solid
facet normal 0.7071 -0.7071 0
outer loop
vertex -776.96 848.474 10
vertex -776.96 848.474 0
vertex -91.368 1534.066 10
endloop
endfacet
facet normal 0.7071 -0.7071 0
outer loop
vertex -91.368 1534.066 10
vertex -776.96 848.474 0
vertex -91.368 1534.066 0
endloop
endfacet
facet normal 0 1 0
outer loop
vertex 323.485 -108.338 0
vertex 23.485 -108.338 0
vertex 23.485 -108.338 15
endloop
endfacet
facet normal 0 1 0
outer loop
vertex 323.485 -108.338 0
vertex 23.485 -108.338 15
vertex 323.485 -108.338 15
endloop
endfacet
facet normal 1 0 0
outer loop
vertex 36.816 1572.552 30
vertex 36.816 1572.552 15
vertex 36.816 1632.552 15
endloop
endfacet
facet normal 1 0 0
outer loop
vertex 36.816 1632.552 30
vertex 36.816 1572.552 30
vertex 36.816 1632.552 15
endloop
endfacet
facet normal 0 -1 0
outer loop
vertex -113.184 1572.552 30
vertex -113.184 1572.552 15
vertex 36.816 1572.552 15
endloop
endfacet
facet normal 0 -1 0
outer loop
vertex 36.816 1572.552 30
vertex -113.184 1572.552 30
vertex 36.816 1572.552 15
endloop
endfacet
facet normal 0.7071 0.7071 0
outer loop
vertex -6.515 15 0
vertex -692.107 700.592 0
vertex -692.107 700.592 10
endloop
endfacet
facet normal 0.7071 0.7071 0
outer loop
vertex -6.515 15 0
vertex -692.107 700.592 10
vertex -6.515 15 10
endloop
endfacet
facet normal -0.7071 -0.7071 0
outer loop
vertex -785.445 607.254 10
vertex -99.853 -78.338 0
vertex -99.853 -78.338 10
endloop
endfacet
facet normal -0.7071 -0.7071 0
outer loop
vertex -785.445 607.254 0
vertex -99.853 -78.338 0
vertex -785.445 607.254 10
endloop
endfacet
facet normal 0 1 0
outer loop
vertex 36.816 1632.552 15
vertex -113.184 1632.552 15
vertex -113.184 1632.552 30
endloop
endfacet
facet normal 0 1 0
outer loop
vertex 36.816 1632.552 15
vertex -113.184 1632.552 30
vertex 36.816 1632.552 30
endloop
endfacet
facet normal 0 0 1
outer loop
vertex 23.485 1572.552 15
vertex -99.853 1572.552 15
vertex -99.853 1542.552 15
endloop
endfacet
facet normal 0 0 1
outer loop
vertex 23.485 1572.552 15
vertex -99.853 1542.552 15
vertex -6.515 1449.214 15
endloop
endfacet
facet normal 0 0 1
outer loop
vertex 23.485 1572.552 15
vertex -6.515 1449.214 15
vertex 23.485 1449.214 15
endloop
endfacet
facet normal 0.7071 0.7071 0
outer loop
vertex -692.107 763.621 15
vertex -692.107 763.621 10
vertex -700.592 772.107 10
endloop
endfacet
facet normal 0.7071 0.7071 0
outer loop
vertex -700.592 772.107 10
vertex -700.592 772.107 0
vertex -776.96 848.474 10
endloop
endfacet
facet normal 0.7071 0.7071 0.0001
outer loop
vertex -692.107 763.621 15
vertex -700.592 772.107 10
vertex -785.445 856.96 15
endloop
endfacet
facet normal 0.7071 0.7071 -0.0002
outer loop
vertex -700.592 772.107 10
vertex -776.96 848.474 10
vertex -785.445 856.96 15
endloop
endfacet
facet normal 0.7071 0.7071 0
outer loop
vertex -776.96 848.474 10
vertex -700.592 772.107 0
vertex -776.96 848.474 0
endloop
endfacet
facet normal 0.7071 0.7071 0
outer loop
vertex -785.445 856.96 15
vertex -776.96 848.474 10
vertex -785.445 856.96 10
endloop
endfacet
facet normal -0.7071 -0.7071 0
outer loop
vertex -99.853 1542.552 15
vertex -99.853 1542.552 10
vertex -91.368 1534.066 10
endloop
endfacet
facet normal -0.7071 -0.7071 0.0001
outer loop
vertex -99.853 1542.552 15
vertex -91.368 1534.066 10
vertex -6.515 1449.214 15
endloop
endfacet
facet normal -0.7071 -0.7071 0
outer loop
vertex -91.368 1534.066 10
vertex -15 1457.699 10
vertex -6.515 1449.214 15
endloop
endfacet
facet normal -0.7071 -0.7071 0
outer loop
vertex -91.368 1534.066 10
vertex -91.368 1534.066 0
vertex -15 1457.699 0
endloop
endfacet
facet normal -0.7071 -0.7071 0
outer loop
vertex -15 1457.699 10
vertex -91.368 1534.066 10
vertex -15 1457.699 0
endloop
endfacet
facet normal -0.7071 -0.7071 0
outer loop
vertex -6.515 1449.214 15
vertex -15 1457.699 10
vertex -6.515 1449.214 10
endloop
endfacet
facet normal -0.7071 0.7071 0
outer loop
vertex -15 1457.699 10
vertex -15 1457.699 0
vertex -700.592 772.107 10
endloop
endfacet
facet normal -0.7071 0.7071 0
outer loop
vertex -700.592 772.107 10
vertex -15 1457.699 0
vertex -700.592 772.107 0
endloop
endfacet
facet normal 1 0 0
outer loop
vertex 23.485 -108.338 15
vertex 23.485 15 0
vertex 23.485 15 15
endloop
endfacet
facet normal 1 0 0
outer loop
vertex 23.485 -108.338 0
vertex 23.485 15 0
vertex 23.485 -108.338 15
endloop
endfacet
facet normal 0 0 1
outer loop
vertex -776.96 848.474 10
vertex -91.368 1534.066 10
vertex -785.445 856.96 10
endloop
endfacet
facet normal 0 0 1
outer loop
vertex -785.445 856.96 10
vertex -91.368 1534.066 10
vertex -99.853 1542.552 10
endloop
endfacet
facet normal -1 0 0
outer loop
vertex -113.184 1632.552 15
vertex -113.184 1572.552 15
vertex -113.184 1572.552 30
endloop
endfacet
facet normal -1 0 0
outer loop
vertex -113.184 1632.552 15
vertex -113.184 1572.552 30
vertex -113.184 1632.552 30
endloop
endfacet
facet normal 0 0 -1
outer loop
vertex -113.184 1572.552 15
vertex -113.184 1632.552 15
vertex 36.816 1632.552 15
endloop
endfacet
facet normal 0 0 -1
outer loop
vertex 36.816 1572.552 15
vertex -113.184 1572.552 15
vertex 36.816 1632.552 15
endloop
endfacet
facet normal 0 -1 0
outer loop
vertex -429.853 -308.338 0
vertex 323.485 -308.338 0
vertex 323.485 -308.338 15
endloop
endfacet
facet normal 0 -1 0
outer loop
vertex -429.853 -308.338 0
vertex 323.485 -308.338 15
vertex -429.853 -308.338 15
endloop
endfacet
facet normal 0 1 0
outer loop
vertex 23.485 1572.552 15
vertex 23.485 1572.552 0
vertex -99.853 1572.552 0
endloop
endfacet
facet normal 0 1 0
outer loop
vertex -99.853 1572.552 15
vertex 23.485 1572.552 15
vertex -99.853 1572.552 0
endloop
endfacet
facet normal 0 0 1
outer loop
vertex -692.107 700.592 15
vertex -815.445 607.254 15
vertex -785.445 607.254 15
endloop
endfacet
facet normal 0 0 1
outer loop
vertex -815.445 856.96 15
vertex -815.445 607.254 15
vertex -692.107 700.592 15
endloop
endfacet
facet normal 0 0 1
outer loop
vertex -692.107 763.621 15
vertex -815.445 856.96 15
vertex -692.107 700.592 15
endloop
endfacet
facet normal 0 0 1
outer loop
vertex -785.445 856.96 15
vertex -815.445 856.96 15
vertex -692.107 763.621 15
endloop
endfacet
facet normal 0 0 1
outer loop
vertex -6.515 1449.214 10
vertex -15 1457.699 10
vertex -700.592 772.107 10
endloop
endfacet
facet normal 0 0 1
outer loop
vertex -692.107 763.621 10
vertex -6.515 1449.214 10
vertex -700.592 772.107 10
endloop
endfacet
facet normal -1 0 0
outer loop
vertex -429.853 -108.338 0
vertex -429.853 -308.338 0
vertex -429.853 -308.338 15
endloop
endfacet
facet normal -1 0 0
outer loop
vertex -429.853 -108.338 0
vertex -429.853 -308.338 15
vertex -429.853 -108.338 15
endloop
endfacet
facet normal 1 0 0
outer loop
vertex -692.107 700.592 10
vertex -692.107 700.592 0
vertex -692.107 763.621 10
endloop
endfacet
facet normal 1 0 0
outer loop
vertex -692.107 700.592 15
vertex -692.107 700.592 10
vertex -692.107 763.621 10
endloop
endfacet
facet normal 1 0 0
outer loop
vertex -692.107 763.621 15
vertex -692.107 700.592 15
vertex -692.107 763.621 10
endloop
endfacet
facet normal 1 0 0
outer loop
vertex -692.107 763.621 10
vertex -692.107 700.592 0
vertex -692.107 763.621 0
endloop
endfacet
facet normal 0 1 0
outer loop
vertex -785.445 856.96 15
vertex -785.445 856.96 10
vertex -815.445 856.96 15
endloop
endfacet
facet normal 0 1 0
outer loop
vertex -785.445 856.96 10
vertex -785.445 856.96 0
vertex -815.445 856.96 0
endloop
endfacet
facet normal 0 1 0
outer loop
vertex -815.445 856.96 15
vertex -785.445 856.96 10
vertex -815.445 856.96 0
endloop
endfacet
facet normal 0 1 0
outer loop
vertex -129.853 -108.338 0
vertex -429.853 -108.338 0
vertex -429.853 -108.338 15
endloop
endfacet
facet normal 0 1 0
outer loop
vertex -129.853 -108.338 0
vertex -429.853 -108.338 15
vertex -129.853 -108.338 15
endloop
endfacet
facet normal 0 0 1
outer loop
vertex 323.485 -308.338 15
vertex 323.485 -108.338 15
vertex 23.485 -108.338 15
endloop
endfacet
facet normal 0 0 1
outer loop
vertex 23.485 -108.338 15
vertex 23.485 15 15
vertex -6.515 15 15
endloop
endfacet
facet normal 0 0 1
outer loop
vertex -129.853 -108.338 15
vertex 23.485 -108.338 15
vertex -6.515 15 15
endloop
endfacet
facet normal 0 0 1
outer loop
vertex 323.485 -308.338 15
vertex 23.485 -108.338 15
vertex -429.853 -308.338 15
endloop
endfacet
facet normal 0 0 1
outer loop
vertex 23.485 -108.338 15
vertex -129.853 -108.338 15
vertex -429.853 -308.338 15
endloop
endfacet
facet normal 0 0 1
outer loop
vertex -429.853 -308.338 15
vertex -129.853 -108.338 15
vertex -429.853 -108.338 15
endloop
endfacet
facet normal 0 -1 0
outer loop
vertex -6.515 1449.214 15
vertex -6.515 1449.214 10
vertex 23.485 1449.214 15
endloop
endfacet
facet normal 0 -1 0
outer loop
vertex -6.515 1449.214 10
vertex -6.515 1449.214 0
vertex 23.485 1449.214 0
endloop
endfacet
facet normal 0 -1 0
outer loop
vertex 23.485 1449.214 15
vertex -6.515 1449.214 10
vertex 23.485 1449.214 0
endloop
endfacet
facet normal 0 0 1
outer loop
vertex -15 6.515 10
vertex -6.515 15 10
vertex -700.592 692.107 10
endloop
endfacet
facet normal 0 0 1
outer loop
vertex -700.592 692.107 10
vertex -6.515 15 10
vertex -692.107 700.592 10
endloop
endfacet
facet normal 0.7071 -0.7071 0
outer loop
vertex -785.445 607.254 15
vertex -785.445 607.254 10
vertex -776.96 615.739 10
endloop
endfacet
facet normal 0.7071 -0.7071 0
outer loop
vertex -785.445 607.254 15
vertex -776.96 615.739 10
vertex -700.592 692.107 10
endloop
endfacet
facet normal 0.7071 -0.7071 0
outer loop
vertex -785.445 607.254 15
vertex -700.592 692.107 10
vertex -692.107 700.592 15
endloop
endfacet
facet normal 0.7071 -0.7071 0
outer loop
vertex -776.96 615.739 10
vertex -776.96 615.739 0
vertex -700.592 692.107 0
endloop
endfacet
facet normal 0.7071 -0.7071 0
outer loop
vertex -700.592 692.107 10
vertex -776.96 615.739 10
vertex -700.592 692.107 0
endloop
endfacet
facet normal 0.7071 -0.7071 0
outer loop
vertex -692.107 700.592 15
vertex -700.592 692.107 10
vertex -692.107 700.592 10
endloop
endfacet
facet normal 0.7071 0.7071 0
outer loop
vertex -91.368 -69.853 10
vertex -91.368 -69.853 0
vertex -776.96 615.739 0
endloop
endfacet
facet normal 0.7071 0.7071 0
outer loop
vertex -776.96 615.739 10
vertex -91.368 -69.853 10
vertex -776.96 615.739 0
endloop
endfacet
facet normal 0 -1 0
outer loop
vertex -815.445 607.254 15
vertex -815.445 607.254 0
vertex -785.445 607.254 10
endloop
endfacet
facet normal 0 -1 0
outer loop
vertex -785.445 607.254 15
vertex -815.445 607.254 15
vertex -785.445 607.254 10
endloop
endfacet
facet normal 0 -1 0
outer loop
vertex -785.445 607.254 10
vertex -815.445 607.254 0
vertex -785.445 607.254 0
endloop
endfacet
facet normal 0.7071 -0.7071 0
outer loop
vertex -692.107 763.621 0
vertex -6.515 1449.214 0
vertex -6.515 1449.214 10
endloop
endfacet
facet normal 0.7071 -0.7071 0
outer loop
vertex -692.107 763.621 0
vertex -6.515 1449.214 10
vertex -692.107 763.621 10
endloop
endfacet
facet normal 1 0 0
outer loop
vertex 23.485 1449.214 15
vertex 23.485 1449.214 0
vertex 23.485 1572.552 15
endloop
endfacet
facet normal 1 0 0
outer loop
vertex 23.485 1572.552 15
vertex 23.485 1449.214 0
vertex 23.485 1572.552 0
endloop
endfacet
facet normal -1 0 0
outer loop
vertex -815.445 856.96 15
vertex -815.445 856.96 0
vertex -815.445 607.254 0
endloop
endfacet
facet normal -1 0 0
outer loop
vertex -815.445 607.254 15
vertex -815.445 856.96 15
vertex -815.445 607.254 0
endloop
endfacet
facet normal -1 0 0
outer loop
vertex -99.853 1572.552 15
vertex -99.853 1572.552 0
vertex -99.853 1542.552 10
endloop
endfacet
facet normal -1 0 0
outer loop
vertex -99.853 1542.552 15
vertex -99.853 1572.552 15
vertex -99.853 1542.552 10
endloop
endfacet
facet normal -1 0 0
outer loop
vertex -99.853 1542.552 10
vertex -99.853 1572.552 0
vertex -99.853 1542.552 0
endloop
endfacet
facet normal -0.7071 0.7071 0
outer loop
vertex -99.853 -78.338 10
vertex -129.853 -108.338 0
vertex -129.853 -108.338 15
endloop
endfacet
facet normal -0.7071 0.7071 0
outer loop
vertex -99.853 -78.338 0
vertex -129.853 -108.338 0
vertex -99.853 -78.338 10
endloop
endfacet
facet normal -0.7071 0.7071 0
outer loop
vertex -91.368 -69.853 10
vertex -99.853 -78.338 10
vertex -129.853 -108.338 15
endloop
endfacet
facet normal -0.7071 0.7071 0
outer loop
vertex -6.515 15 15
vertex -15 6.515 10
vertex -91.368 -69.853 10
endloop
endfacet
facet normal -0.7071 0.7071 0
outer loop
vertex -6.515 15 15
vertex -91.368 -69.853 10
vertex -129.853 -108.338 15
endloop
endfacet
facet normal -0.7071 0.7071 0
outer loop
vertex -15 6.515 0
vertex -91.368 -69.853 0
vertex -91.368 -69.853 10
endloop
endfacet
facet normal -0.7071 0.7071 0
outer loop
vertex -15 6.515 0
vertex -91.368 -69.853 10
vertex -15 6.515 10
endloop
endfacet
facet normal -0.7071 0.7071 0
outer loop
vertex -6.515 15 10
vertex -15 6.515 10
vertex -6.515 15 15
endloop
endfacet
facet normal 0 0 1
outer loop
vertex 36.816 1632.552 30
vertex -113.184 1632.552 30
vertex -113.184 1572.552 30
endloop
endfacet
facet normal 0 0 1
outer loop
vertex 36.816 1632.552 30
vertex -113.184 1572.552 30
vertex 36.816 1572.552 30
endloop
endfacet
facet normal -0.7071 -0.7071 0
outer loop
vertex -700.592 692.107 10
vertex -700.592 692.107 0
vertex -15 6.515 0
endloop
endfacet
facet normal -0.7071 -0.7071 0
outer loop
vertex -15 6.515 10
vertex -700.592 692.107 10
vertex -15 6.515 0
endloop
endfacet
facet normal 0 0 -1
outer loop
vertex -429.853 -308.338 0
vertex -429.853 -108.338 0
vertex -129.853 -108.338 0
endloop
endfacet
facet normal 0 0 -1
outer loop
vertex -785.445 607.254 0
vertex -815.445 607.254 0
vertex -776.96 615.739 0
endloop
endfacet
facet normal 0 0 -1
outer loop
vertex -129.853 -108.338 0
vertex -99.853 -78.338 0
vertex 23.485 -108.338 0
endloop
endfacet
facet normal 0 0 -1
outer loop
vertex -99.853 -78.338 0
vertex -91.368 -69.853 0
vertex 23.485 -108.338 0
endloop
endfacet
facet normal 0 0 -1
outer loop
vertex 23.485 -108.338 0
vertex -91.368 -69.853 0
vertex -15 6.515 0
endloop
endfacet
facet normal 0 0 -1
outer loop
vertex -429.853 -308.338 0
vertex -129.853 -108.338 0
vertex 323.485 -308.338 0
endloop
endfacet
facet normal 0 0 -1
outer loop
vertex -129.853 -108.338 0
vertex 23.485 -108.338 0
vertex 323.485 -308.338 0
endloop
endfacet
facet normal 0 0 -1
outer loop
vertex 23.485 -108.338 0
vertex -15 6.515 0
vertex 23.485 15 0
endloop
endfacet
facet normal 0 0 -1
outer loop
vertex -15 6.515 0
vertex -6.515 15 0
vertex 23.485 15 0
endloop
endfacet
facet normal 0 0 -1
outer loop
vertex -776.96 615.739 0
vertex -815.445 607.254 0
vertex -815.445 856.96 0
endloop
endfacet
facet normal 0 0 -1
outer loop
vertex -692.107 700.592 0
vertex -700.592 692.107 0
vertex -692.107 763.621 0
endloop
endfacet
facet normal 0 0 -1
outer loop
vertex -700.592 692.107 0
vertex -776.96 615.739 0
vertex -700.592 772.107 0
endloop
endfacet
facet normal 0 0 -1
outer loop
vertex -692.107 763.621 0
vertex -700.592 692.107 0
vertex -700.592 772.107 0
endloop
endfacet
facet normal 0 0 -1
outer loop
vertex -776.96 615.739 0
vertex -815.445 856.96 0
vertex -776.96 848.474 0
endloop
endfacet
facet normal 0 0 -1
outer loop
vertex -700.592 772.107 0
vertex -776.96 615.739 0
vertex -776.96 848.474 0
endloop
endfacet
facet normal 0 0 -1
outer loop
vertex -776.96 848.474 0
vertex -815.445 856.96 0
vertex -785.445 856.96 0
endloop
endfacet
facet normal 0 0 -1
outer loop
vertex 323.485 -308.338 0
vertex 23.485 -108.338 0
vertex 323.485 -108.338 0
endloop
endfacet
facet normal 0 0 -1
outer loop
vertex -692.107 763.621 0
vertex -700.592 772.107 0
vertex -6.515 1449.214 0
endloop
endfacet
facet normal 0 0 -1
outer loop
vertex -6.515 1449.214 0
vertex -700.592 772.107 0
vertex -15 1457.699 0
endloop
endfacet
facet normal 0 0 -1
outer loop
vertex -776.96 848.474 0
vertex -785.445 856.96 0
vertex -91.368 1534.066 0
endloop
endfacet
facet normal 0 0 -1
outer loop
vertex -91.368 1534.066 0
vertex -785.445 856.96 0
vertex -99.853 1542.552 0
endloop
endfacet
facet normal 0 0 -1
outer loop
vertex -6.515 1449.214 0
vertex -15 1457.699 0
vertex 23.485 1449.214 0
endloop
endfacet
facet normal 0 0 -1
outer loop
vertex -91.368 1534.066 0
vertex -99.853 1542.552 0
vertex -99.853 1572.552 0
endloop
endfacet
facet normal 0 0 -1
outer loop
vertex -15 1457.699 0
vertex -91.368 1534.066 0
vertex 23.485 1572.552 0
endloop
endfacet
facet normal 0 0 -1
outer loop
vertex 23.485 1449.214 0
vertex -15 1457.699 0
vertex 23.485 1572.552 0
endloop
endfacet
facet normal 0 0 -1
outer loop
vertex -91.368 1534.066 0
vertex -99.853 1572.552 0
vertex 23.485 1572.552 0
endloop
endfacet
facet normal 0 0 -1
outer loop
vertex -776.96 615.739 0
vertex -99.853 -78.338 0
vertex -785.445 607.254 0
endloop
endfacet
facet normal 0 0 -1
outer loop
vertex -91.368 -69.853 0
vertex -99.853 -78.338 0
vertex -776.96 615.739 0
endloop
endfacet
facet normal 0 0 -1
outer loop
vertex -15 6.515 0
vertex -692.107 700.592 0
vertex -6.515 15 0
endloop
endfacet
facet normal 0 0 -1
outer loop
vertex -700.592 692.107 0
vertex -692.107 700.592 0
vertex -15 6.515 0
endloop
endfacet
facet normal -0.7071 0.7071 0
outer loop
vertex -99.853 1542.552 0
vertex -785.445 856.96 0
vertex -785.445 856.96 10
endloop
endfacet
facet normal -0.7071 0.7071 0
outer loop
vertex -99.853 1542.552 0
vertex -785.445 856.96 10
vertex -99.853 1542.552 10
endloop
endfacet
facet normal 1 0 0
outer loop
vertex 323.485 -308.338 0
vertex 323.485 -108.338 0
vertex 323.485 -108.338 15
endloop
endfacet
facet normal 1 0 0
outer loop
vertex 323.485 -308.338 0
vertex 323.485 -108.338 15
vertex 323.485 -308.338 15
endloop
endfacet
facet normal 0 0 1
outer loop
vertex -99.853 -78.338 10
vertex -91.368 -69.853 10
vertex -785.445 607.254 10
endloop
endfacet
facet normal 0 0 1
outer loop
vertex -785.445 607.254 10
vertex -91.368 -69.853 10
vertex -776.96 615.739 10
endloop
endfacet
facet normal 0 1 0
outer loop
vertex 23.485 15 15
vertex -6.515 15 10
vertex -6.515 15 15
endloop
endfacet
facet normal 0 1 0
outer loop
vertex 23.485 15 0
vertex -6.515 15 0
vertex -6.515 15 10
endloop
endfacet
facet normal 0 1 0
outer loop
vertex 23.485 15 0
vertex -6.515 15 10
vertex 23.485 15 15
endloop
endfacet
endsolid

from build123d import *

# Parameters (mm, degrees)
EXTRUDE_THIN1_DEPTH   = 10
EXTRUDE_THIN1_2_DEPTH = 10
BOSS_EXTRUDE1_DEPTH   = 15
BOSS_EXTRUDE2_DEPTH   = 15
BOSS_EXTRUDE3_DEPTH   = 15
SKETCH5_W             = 150
SKETCH5_H             = 60
BOSS_EXTRUDE4_DEPTH   = 15


with BuildPart() as part:
    # Sketch1 → Extrude-Thin1 (new body)
    with BuildSketch(Plane.XY):
        Polygon((-707.106781187, 715.592062561), (8.485281374, 0), (-84.852813742, -93.338095117), (-800.444876303, 622.253967444), align=None)
        Polygon((-707.106781187, 698.621499812), (-8.485281374, 0), (-84.852813742, -76.367532368), (-783.474313555, 622.253967444), align=None, mode=Mode.SUBTRACT)
    extrude(amount=EXTRUDE_THIN1_DEPTH)



with BuildPart() as body_2:
    # Sketch1 → Extrude-Thin1 2 (new body)
    with BuildSketch(Plane.XY):
        Polygon((8.485281374, 1464.213562373), (-707.106781187, 748.621499812), (-800.444876303, 841.959594929), (-84.852813742, 1557.55165749), align=None)
        Polygon((-8.485281374, 1464.213562373), (-707.106781187, 765.592062561), (-783.474313555, 841.959594929), (-84.852813742, 1540.581094741), align=None, mode=Mode.SUBTRACT)
    extrude(amount=EXTRUDE_THIN1_2_DEPTH)


with BuildPart() as part_1:
    add(part.part)

    add(body_2.part)  # Boss-Extrude1 merges body 2
    # Sketch2 → Boss-Extrude1 (add)
    with BuildSketch(Plane.XY):
        Polygon((-692.106781187, 732.106781187), (-815.444876303, 732.106781187), (-815.444876303, 607.253967444), (-785.444876303, 607.253967444), (-692.106781187, 700.592062561), align=None)
        Polygon((-785.444876303, 856.959594929), (-815.444876303, 856.959594929), (-815.444876303, 732.106781187), (-692.106781187, 732.106781187), (-692.106781187, 763.621499812), align=None)
    extrude(amount=BOSS_EXTRUDE1_DEPTH)

    # Sketch3 → Boss-Extrude2 (add)
    with BuildSketch(Plane.XY):
        Polygon((-129.852813742, -108.338095117), (-6.514718626, 15), (23.485281374, 15), (23.485281374, -108.338095117), (323.485281374, -108.338095117), (323.485281374, -308.338095117), (-429.852813742, -308.338095117), (-429.852813742, -108.338095117), align=None)
    extrude(amount=BOSS_EXTRUDE2_DEPTH)

    # Sketch4 → Boss-Extrude3 (add)
    with BuildSketch(Plane.XY):
        Polygon((-99.852813742, 1572.55165749), (-99.852813742, 1542.55165749), (-6.514718626, 1449.213562373), (23.485281374, 1449.213562373), (23.485281374, 1572.55165749), align=None)
    extrude(amount=BOSS_EXTRUDE3_DEPTH)


with BuildPart() as body_2_2:
    # Sketch5 → Boss-Extrude4 (new body)
    with BuildSketch(Plane.XY.offset(15)):
        with Locations((-38.183766184, 1602.55165749)):
            Rectangle(SKETCH5_W, SKETCH5_H)
    extrude(amount=BOSS_EXTRUDE4_DEPTH)


solid = Compound([part_1.part, body_2_2.part])
